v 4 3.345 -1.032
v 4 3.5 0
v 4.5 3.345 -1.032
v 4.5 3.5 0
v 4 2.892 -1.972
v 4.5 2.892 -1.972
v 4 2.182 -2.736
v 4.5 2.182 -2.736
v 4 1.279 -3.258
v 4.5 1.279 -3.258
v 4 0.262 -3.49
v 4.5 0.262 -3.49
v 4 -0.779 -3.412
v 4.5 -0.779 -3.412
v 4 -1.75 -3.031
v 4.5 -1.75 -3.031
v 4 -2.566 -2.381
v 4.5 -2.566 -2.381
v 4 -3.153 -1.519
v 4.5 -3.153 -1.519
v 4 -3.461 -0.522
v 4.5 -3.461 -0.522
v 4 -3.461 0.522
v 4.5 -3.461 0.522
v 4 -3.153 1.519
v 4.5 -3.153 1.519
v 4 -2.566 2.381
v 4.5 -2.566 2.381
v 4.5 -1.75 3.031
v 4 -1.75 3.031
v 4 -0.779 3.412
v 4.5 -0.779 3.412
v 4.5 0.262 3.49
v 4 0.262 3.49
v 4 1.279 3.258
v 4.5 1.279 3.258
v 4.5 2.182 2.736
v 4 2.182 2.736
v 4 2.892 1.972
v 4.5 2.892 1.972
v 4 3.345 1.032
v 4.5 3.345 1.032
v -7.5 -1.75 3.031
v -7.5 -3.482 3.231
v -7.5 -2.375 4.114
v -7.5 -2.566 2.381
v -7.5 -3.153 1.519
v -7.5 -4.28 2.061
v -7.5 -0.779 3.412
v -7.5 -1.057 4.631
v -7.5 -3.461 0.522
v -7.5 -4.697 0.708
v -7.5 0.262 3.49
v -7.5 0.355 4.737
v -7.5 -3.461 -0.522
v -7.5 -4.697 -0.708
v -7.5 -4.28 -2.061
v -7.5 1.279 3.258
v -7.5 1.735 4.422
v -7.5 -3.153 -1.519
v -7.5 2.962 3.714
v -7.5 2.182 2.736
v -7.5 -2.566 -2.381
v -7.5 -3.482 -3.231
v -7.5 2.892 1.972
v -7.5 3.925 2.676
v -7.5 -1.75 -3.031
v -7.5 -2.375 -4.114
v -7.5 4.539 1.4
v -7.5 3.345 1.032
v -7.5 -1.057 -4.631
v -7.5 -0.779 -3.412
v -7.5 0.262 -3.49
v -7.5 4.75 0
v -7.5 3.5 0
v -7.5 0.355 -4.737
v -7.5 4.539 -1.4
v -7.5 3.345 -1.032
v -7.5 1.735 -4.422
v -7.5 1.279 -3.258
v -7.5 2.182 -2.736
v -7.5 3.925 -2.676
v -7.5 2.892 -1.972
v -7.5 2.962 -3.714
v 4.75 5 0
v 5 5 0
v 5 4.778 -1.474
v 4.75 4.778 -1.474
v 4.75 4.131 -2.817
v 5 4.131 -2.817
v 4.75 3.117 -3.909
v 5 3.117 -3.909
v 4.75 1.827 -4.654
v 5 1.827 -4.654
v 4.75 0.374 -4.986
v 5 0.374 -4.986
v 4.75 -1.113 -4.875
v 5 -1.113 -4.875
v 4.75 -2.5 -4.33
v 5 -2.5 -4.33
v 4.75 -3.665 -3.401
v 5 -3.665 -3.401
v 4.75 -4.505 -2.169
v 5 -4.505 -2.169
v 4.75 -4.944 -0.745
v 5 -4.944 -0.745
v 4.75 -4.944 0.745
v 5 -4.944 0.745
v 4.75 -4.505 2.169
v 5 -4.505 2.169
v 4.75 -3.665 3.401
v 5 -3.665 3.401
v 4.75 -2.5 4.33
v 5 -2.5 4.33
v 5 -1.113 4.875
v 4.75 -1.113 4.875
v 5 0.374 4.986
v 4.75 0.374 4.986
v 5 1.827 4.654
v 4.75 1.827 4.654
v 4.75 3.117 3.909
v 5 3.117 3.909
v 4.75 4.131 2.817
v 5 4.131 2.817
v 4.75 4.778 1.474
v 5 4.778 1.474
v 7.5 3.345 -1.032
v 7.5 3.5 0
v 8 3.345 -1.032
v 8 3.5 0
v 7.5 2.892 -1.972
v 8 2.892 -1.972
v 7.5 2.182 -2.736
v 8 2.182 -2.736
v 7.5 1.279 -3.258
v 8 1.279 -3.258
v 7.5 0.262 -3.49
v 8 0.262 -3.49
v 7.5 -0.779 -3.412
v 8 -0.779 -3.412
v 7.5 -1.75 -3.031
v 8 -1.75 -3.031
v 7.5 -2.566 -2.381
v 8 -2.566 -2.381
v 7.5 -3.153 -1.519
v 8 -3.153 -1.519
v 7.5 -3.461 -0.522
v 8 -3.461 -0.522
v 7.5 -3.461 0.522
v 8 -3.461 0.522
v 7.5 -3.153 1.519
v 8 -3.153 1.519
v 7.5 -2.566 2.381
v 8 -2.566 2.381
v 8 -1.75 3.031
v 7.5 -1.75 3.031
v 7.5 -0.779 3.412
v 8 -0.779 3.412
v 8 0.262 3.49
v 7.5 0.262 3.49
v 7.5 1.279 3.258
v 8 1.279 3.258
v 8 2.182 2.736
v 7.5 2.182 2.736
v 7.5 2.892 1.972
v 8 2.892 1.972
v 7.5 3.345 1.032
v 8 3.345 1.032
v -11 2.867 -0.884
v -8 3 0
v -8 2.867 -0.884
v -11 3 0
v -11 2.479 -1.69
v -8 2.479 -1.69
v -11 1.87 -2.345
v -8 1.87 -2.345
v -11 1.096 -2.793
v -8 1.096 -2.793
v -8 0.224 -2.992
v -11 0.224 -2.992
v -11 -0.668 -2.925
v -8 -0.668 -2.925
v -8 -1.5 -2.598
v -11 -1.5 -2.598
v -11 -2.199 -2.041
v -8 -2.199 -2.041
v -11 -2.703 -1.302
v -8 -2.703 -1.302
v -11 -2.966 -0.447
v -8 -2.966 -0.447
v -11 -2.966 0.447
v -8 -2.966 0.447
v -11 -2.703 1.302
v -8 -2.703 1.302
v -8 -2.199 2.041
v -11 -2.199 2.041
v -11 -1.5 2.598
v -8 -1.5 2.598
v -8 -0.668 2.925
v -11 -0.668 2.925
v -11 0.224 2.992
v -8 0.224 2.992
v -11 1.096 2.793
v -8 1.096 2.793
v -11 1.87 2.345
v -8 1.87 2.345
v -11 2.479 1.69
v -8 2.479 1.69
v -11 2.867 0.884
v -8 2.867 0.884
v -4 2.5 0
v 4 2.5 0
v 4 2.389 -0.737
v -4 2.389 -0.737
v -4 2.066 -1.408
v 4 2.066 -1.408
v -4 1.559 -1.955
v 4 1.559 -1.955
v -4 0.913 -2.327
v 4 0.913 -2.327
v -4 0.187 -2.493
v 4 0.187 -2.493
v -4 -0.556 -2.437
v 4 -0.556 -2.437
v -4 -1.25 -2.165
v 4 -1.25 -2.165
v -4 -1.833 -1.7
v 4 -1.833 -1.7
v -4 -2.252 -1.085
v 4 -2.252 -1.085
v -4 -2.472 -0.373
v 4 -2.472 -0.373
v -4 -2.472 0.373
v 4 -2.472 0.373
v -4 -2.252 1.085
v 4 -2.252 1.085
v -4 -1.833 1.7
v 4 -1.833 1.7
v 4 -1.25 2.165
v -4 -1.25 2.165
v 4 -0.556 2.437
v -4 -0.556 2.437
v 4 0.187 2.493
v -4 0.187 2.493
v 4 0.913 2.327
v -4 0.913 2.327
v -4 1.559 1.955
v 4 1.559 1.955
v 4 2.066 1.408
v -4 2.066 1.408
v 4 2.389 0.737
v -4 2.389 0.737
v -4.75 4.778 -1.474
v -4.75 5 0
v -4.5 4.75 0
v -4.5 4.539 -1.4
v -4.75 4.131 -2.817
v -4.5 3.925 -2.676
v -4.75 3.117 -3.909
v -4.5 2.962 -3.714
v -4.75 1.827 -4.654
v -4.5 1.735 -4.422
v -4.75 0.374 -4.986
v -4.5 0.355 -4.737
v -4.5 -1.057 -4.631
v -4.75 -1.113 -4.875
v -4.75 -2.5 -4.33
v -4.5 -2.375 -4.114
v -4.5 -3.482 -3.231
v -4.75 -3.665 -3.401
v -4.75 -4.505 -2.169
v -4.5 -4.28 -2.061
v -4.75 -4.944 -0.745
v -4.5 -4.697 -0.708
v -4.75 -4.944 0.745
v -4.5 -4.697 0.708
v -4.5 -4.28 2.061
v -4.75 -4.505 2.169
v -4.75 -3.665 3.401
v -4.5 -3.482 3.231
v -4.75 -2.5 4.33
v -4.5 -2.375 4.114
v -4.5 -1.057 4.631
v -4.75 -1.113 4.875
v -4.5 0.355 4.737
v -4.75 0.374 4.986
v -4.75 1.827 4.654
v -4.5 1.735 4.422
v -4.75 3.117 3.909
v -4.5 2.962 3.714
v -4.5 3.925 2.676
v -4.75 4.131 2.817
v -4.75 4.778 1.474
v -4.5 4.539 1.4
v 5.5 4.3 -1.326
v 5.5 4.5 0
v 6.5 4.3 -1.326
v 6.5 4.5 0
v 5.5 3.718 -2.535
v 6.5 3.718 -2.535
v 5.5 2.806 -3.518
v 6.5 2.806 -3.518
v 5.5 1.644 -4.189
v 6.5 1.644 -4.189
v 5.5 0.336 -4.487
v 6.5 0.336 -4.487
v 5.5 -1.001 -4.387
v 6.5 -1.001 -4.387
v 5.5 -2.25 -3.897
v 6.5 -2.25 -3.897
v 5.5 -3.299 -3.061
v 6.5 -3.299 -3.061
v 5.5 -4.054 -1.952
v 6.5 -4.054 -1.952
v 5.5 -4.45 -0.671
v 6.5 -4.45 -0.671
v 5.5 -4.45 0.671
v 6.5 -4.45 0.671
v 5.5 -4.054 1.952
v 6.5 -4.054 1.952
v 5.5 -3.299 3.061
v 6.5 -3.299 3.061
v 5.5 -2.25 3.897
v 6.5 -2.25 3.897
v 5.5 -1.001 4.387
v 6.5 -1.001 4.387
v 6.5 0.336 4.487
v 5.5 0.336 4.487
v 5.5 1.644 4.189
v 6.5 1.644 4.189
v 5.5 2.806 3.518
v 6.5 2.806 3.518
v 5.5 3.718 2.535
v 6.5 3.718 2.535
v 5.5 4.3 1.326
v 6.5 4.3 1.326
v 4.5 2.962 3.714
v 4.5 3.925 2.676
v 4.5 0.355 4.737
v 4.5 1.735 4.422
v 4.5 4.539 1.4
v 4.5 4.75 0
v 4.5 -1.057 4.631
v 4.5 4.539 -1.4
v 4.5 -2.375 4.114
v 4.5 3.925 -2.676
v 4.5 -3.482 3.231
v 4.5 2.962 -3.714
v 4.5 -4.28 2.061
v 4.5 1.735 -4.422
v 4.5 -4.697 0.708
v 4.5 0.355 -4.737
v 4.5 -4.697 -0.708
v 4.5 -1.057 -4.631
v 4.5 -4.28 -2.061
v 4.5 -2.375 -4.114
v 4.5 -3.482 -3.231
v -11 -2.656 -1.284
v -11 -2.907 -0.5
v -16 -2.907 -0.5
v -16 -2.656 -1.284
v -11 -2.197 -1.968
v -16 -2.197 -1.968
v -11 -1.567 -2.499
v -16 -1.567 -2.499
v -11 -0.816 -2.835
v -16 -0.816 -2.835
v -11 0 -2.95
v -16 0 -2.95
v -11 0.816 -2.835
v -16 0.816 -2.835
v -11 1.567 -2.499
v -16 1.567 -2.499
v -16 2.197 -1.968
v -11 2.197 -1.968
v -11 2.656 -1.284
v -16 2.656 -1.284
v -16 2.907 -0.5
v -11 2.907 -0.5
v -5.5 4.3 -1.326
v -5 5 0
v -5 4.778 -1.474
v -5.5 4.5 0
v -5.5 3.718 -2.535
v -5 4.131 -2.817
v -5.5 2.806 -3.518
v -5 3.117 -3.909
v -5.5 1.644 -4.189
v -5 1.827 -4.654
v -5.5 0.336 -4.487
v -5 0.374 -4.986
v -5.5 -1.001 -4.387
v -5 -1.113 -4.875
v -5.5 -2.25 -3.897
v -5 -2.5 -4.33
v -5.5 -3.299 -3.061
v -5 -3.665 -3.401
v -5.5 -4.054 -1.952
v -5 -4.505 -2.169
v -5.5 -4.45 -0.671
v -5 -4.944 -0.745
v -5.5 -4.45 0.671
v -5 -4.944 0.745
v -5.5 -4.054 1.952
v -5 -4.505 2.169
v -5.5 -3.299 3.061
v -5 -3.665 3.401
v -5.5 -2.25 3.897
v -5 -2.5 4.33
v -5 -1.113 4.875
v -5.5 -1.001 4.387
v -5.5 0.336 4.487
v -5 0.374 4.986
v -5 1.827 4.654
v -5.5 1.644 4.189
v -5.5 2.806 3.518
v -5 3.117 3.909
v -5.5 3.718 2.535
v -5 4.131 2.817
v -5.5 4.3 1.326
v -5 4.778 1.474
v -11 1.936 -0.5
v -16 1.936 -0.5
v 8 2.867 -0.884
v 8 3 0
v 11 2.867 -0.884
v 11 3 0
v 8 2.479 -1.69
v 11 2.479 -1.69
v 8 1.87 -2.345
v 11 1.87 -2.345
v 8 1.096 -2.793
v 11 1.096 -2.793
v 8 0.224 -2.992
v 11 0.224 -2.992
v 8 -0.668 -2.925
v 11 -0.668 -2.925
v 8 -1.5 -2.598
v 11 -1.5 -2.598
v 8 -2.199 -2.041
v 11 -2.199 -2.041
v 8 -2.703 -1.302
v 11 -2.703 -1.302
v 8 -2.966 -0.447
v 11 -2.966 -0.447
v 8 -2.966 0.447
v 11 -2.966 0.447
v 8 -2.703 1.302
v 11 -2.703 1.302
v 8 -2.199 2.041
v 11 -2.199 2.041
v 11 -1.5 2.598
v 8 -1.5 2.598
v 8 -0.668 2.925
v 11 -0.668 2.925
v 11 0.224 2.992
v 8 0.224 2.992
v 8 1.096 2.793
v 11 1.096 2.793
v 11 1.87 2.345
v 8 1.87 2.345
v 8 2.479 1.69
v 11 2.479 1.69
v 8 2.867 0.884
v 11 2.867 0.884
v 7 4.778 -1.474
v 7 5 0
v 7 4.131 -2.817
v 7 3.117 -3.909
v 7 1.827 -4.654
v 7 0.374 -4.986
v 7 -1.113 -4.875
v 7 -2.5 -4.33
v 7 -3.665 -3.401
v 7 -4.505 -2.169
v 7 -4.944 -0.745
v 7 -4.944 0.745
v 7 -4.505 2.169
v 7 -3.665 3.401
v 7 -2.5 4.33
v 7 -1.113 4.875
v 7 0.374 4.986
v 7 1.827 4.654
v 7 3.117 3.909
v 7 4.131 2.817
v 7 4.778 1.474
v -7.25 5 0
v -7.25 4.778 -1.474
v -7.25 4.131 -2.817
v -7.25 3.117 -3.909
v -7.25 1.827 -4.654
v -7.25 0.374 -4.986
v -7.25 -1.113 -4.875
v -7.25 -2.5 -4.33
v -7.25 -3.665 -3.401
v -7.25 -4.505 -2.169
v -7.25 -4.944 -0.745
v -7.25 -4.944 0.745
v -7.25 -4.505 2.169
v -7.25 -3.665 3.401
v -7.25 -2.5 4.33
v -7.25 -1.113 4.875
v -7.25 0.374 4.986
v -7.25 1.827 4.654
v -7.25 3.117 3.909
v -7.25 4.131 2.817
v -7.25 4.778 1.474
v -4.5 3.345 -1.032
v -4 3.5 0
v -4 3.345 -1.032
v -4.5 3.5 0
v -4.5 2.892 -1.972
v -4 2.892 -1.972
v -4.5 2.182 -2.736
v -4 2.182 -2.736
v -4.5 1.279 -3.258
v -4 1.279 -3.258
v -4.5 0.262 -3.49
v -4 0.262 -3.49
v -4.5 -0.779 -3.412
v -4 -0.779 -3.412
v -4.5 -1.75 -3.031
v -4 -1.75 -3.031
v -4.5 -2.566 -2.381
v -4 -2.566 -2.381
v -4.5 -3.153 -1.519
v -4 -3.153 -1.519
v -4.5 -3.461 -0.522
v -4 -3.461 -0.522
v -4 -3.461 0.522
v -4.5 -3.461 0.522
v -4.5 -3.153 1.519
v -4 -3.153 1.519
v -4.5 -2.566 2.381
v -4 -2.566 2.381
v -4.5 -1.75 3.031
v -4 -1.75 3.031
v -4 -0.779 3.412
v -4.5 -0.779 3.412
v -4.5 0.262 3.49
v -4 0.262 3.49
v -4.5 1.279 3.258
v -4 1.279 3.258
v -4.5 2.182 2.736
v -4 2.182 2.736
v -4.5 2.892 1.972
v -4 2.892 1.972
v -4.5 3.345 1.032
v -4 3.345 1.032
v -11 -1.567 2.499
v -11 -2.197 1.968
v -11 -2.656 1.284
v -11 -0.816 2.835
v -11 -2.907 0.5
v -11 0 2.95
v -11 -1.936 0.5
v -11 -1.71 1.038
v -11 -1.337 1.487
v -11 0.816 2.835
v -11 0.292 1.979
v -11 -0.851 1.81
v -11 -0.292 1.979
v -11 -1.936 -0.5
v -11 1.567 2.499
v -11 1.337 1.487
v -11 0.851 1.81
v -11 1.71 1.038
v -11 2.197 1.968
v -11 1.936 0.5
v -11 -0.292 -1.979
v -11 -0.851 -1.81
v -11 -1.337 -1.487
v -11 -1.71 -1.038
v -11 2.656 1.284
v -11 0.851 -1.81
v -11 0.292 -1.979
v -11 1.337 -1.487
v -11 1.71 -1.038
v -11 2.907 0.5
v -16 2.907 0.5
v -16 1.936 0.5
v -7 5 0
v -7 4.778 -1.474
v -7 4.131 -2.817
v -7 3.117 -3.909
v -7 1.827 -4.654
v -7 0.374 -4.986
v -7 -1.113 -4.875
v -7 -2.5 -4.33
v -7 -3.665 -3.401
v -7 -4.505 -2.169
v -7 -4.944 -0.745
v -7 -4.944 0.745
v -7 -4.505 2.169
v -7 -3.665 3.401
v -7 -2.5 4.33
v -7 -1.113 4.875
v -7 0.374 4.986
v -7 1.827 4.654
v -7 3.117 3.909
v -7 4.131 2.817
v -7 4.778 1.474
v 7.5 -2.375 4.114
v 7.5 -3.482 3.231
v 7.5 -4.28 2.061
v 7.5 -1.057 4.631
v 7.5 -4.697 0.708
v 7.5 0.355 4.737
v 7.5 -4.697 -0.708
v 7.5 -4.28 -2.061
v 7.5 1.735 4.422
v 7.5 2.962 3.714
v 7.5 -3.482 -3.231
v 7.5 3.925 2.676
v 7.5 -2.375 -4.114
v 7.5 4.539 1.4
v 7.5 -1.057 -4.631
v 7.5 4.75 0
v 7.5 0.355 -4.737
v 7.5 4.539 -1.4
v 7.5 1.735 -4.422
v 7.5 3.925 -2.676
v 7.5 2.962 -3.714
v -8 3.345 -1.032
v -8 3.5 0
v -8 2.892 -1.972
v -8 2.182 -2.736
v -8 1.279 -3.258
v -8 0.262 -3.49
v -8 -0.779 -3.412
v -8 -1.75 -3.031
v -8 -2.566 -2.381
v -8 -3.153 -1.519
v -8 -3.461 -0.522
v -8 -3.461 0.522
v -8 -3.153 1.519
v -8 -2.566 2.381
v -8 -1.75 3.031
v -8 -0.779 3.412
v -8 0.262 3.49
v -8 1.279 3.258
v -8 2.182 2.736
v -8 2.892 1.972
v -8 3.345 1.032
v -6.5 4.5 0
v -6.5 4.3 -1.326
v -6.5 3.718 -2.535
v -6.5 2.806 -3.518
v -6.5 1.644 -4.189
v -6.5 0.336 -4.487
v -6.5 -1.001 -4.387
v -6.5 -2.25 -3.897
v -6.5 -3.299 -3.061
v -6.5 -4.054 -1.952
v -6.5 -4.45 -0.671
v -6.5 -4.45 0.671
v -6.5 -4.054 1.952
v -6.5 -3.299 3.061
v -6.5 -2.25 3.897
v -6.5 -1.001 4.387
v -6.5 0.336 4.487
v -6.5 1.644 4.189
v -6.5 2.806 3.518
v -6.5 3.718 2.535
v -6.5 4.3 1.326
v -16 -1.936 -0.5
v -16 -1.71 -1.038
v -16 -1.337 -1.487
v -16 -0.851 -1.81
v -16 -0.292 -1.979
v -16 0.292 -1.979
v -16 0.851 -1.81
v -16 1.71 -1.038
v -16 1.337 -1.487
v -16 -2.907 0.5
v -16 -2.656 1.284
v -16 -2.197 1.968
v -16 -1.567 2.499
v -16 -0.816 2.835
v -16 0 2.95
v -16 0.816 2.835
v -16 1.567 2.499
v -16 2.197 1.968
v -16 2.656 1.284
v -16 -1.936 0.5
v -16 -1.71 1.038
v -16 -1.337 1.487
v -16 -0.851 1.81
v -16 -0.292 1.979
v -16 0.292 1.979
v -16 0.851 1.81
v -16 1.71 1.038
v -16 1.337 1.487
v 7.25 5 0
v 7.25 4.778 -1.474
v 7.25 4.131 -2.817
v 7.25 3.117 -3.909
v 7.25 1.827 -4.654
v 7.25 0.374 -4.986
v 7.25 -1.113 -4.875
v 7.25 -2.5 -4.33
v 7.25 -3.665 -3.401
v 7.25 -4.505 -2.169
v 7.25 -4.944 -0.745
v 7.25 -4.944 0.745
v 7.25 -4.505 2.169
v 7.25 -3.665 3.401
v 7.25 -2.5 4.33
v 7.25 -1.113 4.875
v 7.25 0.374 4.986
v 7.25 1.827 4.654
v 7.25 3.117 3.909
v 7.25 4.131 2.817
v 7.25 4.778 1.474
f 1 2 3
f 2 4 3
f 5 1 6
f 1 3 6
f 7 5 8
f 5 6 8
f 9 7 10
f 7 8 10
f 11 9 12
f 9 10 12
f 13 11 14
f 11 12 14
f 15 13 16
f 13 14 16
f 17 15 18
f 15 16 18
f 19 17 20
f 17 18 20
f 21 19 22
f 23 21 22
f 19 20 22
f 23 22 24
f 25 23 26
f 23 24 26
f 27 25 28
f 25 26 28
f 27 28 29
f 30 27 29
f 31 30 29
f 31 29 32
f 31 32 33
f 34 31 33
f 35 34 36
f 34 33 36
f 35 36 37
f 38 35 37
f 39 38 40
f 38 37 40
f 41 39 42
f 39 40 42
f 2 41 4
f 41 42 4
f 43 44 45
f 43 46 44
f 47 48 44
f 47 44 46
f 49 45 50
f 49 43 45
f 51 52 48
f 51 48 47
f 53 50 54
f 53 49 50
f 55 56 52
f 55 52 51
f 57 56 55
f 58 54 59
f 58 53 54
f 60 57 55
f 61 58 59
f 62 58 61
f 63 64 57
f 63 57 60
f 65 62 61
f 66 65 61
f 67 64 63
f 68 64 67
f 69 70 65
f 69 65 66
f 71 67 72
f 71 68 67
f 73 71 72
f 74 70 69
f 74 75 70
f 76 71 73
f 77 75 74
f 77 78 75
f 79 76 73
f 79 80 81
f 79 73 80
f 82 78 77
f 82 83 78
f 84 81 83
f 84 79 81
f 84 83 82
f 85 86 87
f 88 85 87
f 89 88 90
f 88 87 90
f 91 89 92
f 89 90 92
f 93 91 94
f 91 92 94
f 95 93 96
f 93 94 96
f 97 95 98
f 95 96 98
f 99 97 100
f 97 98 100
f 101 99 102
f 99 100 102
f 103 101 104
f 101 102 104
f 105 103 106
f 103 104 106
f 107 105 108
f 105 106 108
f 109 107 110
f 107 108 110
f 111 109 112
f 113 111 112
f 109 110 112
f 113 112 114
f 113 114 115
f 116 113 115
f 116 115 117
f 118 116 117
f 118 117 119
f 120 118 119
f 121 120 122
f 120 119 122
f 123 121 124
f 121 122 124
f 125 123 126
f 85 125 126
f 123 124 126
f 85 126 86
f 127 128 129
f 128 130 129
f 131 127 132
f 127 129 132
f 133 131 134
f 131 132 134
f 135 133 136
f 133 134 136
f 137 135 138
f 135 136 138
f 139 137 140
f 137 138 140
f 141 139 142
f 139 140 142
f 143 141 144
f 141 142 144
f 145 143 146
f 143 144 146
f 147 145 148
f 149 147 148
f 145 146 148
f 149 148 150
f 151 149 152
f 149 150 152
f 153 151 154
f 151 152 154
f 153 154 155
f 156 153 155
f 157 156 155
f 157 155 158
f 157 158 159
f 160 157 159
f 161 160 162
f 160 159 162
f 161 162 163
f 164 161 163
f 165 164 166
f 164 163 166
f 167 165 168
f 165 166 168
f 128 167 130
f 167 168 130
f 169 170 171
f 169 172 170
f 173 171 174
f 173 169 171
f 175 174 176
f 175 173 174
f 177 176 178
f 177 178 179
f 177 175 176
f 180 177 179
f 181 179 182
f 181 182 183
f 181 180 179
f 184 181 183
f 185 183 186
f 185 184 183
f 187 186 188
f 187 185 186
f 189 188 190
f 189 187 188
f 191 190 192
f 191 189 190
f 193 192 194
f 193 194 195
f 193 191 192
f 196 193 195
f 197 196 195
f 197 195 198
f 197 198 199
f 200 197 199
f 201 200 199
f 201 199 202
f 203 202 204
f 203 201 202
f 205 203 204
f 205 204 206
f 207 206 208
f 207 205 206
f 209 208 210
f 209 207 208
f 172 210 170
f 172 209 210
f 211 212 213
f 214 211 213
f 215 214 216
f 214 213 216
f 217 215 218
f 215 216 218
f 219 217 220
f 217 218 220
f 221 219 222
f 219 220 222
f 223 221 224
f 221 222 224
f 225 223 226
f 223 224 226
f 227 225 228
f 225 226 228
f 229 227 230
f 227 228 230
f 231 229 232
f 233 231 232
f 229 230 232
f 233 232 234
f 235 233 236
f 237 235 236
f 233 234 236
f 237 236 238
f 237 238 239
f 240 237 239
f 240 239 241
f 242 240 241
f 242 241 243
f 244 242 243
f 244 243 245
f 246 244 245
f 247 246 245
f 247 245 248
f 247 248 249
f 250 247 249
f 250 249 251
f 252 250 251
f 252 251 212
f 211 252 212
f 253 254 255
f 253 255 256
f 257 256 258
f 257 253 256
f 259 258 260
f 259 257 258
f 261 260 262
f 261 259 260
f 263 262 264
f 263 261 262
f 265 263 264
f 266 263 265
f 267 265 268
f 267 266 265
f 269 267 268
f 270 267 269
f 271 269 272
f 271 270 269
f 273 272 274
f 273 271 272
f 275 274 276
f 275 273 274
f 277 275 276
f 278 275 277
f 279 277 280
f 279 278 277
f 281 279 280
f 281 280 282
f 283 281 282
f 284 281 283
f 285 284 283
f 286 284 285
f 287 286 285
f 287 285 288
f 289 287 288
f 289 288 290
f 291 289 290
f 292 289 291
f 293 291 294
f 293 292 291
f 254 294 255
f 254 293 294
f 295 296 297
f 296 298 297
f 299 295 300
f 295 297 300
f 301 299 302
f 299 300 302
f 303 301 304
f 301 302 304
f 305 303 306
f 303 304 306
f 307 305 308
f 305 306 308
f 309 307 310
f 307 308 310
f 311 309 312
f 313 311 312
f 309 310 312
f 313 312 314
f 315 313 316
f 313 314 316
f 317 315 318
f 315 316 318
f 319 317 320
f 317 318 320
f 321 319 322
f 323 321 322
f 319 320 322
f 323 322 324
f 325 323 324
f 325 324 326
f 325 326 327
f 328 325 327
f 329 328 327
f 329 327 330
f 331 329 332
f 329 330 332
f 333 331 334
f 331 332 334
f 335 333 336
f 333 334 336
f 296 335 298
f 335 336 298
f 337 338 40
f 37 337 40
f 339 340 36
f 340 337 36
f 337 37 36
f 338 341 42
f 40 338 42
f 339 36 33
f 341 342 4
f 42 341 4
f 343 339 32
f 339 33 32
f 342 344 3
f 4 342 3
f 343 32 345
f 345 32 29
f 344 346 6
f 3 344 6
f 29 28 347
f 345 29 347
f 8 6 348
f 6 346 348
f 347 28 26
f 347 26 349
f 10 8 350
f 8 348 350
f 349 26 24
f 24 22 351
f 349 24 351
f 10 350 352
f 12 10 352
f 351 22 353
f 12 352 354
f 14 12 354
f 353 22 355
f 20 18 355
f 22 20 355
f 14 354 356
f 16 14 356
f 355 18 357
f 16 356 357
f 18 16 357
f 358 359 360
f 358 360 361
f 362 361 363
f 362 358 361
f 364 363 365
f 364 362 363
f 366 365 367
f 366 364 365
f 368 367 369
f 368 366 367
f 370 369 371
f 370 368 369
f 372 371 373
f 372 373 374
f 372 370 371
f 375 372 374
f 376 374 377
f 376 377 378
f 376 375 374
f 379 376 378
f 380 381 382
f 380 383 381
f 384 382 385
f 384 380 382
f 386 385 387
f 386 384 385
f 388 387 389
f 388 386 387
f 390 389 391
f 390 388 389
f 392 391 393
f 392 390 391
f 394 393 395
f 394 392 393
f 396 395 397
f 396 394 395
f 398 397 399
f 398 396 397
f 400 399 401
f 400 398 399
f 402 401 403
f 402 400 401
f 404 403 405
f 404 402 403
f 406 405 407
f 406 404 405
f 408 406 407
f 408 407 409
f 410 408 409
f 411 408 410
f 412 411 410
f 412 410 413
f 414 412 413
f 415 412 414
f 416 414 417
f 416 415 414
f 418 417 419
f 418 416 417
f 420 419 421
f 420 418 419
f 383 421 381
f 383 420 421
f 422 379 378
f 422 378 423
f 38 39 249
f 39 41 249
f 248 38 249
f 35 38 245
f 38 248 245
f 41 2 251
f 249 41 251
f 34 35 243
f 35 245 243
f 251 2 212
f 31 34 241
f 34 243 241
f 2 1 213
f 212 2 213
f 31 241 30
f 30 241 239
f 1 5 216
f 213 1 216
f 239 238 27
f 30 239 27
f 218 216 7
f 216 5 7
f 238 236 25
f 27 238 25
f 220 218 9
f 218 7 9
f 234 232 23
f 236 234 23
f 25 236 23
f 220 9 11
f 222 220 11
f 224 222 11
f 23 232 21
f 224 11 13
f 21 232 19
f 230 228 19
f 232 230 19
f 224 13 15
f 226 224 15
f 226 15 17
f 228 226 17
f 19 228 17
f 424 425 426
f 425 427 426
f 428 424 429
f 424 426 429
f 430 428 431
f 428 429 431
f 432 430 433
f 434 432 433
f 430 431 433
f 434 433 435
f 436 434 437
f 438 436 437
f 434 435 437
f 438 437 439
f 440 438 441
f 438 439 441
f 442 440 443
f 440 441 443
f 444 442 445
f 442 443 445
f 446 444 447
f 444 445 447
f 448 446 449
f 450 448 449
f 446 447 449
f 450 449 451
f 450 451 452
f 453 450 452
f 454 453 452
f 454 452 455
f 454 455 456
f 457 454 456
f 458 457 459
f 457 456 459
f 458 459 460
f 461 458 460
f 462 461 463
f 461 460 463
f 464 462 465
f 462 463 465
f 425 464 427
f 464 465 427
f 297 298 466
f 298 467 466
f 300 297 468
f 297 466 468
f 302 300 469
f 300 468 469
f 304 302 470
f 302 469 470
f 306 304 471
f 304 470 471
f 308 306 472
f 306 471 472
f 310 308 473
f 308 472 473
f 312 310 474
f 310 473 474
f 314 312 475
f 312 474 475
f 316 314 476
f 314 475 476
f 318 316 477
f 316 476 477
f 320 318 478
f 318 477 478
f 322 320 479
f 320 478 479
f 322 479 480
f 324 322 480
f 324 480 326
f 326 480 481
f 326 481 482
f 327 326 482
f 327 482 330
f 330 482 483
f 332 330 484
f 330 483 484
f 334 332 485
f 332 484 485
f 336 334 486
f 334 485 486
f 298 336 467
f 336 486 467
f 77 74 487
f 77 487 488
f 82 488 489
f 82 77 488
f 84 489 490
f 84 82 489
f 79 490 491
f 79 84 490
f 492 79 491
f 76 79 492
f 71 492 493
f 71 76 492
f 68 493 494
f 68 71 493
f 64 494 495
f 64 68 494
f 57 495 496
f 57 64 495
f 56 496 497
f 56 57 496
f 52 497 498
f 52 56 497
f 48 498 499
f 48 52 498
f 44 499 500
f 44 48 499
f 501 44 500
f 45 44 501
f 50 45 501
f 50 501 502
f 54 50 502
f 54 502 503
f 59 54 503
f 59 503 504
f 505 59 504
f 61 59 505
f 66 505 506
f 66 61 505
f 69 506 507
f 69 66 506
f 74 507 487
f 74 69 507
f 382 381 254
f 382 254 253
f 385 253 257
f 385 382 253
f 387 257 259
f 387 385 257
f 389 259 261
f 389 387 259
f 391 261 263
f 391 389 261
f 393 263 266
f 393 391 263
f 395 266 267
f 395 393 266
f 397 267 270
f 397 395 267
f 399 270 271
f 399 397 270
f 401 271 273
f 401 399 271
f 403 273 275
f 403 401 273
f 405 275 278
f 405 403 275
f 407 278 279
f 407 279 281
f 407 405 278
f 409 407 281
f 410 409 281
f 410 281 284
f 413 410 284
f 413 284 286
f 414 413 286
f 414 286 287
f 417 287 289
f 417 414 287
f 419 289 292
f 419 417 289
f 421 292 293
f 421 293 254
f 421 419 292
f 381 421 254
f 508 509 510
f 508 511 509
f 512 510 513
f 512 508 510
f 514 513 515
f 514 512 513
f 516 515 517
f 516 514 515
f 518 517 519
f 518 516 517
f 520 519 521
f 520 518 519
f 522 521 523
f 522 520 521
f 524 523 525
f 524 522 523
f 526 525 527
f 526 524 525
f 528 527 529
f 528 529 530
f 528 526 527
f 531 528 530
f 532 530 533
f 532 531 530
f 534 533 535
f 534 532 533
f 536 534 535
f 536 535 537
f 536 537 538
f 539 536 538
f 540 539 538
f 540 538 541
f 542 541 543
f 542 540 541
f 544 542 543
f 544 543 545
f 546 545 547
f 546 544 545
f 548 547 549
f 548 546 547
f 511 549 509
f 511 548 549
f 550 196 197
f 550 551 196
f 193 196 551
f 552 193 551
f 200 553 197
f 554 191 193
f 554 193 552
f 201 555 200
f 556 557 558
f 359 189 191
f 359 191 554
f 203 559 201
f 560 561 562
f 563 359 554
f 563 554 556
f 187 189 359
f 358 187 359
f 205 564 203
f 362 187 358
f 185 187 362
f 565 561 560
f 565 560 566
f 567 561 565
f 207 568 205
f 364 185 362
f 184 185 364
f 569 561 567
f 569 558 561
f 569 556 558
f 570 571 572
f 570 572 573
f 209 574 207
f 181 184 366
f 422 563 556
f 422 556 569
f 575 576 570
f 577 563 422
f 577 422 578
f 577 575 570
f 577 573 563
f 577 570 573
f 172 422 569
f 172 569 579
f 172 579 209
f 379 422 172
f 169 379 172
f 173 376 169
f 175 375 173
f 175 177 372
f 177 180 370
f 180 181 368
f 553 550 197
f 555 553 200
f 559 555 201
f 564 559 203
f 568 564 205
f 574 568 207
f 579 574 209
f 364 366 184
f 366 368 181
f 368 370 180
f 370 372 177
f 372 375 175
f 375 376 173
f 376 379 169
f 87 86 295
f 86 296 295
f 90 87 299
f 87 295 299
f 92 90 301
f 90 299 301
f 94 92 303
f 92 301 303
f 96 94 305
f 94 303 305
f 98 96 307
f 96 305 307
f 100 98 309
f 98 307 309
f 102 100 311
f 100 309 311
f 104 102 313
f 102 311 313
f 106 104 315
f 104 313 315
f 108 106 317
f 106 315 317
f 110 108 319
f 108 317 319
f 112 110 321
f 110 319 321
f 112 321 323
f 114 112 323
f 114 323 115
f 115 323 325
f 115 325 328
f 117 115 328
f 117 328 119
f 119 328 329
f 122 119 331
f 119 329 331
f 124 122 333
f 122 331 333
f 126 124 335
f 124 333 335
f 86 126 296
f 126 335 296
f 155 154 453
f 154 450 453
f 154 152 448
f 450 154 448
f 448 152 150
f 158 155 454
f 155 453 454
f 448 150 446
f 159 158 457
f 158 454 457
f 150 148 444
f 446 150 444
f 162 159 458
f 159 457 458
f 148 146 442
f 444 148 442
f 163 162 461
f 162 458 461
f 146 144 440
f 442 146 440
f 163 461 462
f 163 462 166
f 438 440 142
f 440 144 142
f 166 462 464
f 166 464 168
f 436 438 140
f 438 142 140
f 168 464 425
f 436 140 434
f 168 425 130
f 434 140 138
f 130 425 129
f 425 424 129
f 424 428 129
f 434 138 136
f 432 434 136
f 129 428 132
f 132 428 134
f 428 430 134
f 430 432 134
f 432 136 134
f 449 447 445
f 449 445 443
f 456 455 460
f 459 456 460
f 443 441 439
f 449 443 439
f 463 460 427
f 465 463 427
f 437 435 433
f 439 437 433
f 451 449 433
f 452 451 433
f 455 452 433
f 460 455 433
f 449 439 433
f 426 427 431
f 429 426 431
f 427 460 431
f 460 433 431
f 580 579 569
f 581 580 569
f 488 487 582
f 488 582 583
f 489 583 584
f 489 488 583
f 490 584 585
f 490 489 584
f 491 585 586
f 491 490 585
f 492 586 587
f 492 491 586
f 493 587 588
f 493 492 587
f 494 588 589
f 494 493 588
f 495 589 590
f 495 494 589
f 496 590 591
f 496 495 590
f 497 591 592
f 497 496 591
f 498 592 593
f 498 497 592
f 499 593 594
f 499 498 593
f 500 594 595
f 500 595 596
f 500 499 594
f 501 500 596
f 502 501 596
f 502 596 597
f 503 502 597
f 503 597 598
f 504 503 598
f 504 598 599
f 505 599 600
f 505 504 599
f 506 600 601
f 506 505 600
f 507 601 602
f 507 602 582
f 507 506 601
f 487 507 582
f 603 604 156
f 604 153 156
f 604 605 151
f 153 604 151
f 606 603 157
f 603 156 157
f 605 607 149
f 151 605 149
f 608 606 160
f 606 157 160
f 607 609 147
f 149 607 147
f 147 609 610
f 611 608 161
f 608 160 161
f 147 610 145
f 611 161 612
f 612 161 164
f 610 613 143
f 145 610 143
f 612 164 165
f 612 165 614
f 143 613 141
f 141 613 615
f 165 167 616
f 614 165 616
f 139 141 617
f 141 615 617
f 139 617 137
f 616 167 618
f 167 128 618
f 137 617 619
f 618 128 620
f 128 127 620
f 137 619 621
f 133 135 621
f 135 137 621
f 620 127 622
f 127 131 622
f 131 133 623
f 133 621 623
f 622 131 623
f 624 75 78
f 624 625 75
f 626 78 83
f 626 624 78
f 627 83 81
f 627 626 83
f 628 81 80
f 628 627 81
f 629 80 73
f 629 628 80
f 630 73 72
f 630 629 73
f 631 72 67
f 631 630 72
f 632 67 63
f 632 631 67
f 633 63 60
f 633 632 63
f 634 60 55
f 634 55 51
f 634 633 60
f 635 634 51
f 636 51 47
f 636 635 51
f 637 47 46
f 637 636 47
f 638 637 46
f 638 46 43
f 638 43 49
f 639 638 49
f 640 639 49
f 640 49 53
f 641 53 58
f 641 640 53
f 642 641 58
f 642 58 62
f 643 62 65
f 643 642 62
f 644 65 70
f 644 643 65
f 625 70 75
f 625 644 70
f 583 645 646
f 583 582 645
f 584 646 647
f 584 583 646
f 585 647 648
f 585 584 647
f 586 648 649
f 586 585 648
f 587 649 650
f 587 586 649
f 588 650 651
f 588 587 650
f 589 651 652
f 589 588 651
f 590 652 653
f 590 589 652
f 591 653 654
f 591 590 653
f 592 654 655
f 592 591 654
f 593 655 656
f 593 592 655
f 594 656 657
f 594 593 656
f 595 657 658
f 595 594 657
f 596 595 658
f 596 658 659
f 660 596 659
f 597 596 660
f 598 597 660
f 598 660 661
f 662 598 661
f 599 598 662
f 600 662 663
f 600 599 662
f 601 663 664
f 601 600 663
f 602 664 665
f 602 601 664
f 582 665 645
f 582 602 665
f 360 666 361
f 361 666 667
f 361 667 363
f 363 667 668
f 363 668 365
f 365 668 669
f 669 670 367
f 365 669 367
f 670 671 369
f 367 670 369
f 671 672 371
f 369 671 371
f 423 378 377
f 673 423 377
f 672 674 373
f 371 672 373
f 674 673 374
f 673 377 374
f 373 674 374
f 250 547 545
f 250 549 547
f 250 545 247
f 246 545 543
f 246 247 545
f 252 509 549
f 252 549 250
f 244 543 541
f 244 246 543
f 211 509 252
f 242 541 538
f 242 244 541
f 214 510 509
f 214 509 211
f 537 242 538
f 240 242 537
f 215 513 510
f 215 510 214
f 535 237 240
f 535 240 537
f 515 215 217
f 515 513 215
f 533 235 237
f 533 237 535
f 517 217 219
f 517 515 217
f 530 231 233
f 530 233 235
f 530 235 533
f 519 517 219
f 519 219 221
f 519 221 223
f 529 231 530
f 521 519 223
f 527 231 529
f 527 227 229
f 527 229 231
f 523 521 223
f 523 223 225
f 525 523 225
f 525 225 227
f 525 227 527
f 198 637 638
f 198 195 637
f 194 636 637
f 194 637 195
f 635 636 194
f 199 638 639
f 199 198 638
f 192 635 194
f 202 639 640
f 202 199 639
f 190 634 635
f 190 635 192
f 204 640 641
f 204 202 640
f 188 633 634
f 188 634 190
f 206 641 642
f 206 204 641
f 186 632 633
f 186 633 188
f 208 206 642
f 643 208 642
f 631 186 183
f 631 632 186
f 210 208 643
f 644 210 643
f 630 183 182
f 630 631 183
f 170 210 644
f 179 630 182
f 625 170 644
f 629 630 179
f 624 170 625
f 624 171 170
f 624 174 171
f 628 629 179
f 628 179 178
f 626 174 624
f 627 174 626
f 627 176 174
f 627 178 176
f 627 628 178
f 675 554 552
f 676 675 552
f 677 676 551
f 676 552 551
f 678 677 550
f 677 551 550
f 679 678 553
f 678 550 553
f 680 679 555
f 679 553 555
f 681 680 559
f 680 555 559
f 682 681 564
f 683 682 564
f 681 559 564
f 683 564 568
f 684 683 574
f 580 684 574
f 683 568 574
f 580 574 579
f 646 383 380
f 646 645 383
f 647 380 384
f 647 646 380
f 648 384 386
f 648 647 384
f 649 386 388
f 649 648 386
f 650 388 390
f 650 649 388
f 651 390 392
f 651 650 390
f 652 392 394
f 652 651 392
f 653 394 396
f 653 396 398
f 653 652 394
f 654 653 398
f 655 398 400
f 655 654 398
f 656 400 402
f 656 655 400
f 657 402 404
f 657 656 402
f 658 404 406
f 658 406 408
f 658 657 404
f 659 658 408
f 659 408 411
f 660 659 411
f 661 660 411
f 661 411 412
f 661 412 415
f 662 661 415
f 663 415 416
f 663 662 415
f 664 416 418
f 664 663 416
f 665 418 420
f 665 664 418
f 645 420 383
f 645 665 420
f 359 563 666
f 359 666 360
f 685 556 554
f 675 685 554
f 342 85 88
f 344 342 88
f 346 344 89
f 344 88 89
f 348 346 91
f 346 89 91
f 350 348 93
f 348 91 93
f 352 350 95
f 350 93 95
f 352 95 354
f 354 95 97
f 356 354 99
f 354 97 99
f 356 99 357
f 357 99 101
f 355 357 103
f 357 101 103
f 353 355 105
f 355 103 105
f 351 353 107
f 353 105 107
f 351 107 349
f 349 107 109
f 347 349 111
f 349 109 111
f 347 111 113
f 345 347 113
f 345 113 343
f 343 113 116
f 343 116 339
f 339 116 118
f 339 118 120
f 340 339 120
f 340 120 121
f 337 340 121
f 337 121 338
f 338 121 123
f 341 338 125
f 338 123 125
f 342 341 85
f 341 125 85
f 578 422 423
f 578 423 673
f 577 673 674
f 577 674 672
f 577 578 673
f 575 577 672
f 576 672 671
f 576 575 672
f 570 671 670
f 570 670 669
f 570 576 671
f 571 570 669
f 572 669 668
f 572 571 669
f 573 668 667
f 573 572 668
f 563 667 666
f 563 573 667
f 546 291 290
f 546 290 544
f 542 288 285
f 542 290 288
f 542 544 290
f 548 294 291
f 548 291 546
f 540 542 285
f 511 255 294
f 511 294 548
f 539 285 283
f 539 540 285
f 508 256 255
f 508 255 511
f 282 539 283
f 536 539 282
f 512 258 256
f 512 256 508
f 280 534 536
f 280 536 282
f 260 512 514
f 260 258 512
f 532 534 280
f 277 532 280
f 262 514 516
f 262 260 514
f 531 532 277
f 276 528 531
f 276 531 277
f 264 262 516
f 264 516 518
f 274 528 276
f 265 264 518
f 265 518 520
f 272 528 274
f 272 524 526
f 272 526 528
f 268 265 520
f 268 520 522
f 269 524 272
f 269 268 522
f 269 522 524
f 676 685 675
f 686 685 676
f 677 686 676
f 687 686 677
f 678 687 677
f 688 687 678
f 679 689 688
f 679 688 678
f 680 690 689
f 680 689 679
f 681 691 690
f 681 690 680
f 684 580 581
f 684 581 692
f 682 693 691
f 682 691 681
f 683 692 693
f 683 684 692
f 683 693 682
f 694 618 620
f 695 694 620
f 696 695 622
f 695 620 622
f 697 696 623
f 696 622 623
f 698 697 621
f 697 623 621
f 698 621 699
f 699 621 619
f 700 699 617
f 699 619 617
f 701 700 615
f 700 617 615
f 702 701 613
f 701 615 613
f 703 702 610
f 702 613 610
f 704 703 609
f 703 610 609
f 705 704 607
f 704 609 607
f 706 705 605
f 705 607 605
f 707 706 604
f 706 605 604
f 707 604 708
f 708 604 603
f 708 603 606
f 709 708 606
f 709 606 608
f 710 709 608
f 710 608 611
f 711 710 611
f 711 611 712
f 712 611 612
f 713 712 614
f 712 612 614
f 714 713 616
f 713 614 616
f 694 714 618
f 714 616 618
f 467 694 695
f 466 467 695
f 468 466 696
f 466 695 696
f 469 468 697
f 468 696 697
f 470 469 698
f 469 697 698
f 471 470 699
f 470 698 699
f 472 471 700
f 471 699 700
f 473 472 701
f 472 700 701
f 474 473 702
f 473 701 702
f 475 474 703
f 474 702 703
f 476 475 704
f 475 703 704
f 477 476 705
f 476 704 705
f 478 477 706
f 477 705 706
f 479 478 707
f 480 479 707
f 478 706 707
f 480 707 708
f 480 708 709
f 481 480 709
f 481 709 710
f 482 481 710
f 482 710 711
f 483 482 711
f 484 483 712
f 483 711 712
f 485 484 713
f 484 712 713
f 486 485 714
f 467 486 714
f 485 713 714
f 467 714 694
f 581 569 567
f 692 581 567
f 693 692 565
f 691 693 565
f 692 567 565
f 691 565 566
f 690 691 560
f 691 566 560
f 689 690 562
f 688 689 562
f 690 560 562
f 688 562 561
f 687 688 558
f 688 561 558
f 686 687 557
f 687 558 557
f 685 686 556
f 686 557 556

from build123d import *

# Parameters (mm, degrees)
FASE1_SIZE                      = 0.25
AUFSATZ_LINEAR_AUSTRAGEN1_DEPTH = 5


with BuildPart() as part:
    # Skizze1 → Rotation1 (revolve)
    with BuildSketch(Plane.XY):
        Polygon((-8, 3), (-11, 3), (-11, 0), (0, 0), (0, 2.5), (-4, 2.5), (-4, 3.5), (-4.5, 3.5), (-4.5, 5), (-5, 5), (-5.5, 4.5), (-6.5, 4.5), (-7, 5), (-7.5, 5), (-7.5, 3.5), (-8, 3.5), align=None)
    revolve(axis=Axis((-5.518776228, 0, 0), (-1, 0, 0)))

    # Fase1
    fase1_edges = [part.edges().sort_by_distance(p)[0] for p in [
        (-4.5, -5, 0),
        (-7.5, -5, 0),
    ]]
    chamfer(fase1_edges, length=FASE1_SIZE)

    # Spiegeln1: part across plane


with BuildPart() as part_1:
    add(part.part)
    add(part.part.mirror(Plane(origin=(0, 0, 0), x_dir=(0, 0, 1), z_dir=(1, 0, 0))))

    # Skizze2 → Aufsatz-Linear austragen1 (add)
    with BuildSketch(Plane.ZY.offset(11)):
        with BuildLine():
            Line((-0.5, -1.936491673), (-0.5, -2.907318352))
            ThreePointArc((-0.5, -2.907318352), (-2.95, 0), (-0.5, 2.907318352))
            Line((-0.5, 2.907318352), (-0.5, 1.936491673))
            ThreePointArc((-0.5, 1.936491673), (-2, 0), (-0.5, -1.936491673))
        make_face()
        with BuildLine():
            Line((0.5, -1.936491673), (0.5, -2.907318352))
            ThreePointArc((0.5, -2.907318352), (2.95, 0), (0.5, 2.907318352))
            Line((0.5, 2.907318352), (0.5, 1.936491673))
            ThreePointArc((0.5, 1.936491673), (2, 0), (0.5, -1.936491673))
        make_face()
    extrude(amount=AUFSATZ_LINEAR_AUSTRAGEN1_DEPTH)


solid = part_1.part
